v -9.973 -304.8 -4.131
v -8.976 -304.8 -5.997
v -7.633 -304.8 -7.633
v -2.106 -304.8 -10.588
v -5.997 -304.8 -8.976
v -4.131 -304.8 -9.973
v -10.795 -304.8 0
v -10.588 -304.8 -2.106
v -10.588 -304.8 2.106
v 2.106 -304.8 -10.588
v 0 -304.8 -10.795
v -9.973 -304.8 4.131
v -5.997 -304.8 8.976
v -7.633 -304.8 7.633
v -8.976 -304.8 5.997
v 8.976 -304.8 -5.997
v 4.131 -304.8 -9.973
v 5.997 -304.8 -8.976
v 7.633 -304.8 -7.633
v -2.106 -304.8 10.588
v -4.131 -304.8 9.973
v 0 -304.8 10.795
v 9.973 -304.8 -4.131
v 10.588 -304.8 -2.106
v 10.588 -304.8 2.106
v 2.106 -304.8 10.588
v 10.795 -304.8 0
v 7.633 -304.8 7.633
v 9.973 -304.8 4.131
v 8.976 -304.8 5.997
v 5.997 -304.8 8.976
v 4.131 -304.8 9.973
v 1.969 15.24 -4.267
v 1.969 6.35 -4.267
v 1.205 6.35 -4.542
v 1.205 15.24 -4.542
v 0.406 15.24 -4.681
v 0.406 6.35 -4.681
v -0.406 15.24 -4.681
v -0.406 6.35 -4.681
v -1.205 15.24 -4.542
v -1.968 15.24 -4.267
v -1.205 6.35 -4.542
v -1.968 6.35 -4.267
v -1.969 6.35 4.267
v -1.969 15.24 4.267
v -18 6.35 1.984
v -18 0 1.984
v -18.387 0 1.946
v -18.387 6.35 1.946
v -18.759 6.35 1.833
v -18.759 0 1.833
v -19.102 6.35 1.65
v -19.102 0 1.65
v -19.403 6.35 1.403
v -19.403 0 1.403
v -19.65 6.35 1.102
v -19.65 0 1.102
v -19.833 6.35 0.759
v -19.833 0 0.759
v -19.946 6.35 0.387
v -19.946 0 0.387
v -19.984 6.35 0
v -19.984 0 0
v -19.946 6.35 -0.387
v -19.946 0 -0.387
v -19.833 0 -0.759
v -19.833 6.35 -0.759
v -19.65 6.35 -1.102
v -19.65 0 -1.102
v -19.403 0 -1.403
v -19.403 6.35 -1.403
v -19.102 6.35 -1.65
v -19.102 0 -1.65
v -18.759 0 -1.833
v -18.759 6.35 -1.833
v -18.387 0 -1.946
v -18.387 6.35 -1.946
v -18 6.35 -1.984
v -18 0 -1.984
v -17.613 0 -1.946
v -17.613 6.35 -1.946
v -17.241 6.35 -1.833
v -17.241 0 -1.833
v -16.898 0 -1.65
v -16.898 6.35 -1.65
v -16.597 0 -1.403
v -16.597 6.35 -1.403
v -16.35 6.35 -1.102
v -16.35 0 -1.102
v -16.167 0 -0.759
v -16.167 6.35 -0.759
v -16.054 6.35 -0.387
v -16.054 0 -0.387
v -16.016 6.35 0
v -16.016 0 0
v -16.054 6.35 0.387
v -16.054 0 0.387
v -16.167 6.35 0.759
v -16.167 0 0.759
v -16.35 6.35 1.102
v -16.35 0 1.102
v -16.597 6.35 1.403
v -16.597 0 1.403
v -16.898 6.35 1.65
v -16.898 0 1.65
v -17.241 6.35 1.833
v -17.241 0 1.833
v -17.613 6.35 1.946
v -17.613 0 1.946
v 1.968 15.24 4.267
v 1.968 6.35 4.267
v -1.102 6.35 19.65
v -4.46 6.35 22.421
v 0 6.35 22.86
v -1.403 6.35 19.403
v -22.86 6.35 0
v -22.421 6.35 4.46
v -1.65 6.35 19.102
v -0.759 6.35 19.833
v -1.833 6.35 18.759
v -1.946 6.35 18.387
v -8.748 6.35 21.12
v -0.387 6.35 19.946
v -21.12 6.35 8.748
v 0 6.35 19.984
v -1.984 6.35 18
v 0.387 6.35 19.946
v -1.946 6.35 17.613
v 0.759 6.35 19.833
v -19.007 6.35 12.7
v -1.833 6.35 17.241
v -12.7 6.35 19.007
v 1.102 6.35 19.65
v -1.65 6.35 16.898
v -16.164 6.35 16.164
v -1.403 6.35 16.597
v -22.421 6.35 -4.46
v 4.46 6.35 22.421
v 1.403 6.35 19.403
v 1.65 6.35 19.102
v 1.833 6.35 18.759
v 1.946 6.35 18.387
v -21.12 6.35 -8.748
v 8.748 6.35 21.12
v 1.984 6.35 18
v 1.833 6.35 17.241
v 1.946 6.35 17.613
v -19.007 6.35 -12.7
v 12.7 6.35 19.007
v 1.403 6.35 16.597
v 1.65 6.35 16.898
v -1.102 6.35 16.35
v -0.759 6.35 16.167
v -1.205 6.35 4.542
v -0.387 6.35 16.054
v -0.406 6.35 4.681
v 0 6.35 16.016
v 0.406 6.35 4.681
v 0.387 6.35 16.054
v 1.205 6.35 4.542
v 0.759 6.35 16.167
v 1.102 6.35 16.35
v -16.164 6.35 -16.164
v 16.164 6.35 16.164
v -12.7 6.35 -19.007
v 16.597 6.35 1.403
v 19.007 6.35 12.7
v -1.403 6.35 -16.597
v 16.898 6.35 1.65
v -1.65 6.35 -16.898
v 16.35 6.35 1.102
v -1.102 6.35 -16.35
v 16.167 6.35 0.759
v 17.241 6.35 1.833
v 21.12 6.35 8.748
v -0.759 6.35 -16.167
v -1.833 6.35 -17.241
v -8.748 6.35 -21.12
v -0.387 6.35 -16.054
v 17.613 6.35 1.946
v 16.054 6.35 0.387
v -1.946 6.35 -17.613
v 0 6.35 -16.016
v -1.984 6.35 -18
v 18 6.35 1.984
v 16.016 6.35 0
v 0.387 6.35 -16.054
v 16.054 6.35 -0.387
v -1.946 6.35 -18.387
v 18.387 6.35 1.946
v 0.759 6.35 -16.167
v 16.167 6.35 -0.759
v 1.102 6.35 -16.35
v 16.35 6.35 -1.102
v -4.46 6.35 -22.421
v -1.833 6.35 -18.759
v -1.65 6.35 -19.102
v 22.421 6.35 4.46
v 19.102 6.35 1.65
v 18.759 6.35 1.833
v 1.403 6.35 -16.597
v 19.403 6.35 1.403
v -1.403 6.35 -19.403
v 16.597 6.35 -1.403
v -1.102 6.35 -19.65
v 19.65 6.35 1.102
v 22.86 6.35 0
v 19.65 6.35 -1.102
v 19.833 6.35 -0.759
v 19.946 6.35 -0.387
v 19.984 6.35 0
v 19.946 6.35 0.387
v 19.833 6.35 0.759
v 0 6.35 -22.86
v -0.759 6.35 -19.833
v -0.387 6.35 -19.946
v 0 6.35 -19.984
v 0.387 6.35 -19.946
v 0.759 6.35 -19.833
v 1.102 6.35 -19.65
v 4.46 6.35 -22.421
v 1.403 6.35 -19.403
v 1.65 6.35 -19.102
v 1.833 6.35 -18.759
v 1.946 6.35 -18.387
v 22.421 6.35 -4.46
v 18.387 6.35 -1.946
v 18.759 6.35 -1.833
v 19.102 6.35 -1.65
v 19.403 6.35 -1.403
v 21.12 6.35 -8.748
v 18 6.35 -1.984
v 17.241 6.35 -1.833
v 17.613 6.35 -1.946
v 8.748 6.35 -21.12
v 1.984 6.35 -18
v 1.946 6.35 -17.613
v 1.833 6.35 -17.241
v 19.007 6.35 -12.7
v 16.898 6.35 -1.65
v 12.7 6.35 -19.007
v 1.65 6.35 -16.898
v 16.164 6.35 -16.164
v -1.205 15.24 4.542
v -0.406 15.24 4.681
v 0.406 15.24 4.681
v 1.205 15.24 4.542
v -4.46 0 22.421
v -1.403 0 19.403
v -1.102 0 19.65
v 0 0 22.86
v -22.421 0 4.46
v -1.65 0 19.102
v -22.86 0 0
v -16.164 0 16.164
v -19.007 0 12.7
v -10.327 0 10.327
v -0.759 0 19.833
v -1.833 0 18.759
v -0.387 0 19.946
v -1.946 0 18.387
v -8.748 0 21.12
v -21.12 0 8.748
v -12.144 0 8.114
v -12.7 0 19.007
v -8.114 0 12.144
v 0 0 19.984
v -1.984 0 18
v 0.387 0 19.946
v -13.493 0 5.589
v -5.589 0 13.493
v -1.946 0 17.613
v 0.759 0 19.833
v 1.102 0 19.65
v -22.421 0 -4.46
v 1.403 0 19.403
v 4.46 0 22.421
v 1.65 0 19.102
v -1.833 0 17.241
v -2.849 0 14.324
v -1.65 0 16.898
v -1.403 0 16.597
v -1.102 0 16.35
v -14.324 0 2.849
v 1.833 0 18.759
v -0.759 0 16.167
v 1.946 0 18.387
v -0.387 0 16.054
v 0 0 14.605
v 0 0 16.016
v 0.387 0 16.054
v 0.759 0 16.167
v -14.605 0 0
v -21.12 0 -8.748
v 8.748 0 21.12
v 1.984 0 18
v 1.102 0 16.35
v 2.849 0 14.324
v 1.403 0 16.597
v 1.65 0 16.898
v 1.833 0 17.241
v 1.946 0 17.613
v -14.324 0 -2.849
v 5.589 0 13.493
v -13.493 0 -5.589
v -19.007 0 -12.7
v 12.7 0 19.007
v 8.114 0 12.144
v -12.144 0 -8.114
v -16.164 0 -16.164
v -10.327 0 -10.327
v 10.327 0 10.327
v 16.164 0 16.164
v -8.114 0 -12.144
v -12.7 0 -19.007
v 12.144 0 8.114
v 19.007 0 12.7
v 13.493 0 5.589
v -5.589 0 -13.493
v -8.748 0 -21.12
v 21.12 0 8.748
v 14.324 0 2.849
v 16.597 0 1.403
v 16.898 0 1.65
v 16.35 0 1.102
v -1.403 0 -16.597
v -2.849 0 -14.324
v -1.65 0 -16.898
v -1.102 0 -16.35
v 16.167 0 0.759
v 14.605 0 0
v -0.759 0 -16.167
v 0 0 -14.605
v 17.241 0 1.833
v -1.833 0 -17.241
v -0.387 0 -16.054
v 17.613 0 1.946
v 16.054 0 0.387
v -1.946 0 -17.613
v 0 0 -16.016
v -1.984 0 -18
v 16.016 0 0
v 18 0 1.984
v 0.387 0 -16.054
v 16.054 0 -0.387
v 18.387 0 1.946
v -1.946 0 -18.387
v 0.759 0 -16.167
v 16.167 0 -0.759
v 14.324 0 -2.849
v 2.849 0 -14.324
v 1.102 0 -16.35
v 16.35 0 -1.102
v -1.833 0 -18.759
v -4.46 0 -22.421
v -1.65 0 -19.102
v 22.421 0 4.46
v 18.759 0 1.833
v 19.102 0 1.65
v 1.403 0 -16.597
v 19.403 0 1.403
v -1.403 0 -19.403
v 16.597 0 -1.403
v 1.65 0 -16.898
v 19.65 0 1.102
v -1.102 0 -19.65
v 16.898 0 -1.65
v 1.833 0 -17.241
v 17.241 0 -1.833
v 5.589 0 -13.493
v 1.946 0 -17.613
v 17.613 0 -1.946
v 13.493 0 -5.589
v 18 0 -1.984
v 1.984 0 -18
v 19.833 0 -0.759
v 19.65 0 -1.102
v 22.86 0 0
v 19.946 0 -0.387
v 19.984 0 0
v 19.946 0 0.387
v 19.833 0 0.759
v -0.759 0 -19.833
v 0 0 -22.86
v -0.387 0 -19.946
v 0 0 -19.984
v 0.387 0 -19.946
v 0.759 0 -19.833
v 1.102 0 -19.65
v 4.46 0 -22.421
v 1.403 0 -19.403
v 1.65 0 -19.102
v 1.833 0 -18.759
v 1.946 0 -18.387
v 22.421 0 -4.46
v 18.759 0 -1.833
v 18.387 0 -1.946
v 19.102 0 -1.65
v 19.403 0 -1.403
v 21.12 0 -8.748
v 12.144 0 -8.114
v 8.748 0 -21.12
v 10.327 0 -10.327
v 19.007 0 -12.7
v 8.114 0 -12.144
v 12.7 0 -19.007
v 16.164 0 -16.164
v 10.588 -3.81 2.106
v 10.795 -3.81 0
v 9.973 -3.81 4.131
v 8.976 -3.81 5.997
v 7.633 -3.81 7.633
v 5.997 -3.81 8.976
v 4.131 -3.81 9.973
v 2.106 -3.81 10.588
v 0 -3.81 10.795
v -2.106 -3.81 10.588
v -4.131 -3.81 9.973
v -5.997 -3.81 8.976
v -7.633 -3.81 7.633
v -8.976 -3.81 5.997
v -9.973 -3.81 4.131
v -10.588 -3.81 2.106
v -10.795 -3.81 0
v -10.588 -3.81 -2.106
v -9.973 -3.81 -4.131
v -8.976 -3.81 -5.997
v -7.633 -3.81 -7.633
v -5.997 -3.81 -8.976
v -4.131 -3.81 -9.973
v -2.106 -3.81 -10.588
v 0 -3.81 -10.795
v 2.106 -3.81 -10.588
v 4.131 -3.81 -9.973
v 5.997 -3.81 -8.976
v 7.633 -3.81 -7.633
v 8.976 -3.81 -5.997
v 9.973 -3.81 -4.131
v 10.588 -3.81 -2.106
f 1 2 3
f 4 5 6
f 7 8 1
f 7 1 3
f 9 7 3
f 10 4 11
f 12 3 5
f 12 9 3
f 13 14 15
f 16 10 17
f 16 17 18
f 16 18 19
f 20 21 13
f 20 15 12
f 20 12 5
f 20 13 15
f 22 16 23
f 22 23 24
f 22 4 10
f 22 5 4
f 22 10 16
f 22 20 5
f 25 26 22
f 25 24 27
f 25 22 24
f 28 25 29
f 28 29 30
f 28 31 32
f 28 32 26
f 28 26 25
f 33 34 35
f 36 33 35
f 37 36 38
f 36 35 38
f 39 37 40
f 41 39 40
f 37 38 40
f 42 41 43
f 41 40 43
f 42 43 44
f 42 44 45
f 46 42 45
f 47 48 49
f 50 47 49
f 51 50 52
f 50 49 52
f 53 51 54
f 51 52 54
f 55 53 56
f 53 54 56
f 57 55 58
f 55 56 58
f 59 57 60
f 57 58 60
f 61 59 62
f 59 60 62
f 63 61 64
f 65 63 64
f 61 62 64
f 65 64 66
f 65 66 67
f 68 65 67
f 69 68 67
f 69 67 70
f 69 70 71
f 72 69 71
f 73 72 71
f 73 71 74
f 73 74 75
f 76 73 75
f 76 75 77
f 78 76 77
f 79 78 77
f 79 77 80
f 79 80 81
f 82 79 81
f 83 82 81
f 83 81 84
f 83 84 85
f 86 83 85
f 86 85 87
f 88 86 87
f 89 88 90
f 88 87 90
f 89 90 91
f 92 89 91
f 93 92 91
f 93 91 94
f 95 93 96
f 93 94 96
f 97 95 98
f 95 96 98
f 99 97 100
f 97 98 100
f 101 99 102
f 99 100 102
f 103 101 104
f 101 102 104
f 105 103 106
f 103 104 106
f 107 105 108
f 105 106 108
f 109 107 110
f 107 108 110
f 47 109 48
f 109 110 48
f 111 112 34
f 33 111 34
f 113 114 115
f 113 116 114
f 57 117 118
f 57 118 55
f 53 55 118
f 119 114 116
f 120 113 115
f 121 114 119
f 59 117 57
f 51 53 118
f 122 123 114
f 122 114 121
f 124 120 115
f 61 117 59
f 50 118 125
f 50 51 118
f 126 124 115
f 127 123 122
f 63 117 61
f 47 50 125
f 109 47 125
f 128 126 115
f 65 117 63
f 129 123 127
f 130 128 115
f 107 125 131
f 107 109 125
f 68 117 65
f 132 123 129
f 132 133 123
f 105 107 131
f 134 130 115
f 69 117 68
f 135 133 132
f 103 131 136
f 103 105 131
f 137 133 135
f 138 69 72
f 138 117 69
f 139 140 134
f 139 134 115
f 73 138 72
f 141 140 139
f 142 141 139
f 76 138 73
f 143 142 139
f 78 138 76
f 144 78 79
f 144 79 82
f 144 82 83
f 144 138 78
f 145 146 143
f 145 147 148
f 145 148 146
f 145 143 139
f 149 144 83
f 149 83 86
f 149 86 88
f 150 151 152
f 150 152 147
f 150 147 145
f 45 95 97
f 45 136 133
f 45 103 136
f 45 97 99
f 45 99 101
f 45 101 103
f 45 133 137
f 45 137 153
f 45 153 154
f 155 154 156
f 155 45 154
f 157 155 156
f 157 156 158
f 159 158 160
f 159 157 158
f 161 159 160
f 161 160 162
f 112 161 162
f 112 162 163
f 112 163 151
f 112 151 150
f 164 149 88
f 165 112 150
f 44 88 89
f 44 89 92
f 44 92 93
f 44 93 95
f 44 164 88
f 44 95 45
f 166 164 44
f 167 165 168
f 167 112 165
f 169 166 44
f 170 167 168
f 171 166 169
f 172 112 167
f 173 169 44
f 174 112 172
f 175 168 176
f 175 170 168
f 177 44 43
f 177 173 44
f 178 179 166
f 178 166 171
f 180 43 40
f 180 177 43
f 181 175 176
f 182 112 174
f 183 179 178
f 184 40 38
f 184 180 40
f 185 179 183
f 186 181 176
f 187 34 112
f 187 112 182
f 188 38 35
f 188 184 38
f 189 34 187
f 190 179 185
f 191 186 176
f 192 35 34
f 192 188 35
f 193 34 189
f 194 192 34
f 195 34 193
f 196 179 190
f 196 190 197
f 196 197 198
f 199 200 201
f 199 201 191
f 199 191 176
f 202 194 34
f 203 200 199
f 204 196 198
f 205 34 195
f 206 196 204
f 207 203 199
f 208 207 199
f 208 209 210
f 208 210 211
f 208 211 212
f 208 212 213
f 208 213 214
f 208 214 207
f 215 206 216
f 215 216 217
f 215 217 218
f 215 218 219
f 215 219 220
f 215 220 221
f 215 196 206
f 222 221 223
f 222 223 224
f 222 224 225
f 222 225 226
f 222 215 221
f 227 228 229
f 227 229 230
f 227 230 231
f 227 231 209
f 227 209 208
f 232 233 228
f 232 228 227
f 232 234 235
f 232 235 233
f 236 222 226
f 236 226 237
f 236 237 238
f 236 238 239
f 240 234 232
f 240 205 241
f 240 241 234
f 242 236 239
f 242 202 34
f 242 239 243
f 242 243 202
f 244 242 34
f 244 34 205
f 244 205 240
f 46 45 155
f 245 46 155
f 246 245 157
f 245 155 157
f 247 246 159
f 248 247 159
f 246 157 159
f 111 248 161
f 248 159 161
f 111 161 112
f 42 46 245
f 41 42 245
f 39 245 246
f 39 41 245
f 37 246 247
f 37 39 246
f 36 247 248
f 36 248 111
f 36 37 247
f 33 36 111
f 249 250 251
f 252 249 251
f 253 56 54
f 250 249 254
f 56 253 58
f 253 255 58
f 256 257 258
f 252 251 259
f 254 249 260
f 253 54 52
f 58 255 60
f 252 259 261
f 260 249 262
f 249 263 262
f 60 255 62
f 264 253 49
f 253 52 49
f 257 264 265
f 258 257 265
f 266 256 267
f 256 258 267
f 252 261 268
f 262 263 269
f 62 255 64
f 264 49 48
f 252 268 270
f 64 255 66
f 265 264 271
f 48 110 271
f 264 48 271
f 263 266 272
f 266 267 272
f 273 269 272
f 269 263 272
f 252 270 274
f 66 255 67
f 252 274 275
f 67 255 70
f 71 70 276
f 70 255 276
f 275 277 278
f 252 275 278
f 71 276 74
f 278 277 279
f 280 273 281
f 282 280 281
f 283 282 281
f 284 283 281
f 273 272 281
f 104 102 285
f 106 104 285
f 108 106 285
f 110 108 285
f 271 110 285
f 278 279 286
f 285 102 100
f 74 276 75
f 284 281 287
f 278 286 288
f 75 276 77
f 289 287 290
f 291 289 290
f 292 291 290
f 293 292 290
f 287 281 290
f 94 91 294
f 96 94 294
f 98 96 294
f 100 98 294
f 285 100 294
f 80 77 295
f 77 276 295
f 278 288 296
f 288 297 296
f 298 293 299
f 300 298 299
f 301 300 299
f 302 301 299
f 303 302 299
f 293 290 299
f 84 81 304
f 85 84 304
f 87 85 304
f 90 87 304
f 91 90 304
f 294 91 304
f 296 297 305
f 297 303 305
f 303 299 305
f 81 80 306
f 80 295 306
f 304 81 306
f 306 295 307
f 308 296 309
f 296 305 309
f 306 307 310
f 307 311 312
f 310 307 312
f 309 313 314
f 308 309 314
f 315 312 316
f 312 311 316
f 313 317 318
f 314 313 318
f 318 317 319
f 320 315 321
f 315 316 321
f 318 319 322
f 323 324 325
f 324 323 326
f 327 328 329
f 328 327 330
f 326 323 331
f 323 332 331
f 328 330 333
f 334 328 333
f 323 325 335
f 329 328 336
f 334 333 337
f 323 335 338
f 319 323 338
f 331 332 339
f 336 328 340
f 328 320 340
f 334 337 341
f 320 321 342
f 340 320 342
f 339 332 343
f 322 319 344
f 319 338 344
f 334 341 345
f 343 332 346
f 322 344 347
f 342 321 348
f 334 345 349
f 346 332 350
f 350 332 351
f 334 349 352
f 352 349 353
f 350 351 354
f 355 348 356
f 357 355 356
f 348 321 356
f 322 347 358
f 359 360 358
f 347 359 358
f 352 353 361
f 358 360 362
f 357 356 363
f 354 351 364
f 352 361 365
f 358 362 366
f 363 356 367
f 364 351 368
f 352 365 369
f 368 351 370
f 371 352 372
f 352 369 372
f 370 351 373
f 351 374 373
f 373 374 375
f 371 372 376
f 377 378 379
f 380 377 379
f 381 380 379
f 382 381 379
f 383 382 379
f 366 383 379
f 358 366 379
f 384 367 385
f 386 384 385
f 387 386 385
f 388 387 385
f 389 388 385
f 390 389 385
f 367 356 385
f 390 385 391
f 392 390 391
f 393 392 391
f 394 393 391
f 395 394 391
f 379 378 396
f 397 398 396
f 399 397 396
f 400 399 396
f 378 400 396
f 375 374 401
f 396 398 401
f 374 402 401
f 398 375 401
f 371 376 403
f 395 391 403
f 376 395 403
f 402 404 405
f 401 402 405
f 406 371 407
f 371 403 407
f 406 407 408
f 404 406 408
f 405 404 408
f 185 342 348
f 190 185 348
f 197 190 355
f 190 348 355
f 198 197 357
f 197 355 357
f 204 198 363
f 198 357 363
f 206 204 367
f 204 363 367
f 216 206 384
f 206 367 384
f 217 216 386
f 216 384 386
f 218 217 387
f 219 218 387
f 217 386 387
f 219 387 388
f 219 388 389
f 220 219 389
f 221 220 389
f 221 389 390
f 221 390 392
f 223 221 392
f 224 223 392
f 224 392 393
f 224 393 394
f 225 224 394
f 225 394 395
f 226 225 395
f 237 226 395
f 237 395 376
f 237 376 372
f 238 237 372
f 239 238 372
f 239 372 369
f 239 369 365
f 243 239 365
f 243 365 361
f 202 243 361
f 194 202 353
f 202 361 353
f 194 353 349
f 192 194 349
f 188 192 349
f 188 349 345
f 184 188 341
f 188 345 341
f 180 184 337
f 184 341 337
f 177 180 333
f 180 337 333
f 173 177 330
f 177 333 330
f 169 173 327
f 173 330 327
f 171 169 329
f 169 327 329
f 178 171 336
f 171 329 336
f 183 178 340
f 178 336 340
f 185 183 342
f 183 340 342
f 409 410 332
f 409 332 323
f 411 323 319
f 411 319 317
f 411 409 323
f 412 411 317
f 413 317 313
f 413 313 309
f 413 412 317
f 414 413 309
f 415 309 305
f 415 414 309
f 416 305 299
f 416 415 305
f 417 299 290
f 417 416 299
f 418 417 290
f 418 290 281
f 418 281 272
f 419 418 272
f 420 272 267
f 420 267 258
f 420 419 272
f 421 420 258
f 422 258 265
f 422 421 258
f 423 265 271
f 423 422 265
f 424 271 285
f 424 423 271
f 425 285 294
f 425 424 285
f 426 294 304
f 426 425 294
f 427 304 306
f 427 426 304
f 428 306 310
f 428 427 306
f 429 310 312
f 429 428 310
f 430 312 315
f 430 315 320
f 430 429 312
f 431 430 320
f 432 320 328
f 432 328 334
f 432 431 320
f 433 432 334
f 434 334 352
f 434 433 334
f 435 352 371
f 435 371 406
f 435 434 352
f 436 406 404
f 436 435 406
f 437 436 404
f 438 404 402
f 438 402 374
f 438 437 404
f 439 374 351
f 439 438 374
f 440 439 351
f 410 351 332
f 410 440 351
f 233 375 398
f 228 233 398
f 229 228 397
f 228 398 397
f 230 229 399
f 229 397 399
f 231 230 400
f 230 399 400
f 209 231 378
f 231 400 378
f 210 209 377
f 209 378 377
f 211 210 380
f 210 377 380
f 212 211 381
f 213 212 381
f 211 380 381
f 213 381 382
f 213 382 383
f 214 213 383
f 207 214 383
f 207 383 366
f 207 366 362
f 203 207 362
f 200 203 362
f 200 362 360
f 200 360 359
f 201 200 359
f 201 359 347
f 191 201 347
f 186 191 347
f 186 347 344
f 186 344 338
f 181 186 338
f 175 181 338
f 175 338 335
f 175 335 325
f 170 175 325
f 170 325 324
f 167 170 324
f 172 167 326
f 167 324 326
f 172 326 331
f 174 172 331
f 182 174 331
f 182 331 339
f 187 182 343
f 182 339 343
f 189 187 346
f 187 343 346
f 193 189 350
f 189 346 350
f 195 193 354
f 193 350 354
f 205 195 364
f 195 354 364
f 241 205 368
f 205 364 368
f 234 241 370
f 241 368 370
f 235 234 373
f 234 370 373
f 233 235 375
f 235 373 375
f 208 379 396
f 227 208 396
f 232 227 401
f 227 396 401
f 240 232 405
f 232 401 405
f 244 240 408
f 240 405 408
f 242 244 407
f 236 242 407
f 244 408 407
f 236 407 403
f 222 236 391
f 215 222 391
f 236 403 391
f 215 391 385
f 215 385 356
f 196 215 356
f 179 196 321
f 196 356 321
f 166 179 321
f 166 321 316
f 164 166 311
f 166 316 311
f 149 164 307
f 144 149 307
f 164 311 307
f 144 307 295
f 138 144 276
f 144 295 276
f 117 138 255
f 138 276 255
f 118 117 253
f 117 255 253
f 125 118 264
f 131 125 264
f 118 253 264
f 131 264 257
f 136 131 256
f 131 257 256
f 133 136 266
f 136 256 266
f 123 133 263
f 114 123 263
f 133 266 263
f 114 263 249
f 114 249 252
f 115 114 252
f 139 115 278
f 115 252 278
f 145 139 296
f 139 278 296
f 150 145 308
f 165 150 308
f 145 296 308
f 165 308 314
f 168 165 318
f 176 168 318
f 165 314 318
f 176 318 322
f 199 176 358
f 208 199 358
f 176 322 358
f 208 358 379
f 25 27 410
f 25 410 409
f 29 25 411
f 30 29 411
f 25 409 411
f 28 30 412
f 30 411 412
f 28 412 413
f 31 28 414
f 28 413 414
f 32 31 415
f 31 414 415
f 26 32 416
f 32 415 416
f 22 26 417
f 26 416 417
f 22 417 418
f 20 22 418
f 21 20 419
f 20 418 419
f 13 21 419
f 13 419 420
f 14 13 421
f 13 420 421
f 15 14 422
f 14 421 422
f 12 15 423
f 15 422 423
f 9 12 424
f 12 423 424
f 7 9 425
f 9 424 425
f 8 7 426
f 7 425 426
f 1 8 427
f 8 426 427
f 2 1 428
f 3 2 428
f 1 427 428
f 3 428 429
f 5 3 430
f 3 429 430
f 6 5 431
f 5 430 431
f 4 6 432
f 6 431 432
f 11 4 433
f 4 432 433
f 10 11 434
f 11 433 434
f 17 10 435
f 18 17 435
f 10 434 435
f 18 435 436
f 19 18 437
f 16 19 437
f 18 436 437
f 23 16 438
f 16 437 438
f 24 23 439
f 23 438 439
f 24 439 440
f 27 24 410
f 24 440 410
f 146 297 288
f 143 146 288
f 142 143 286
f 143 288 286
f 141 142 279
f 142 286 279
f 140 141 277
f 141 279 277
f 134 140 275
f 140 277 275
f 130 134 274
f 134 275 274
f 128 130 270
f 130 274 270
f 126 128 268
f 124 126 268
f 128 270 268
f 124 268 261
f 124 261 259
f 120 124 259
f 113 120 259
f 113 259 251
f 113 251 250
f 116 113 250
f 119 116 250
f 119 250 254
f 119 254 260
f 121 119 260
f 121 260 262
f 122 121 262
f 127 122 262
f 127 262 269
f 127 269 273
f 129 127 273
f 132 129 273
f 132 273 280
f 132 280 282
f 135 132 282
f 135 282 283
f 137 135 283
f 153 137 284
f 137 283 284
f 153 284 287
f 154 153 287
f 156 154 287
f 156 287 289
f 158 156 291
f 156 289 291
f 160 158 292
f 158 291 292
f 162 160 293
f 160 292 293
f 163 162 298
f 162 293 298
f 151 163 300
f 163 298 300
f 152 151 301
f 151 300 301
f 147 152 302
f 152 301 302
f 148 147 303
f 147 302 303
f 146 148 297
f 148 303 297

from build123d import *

# Parameters (mm, degrees)
SKETCH1_R                           = 22.86
BOSS_EXTRUDE1_DEPTH                 = 6.35
BOSS_EXTRUDE2_DEPTH                 = 8.89
SKETCH3_R                           = 10.795
BOSS_EXTRUDE3_DEPTH                 = 304.8
CHAMFER1_SIZE                       = 3.81
F_5_32_0_15625_DIAMETER_HOLE1_D     = 3.96875
F_5_32_0_15625_DIAMETER_HOLE1_DEPTH = 6.351
CIRPATTERN1_COUNT                   = 4


with BuildPart() as part:
    # Sketch1 → Boss-Extrude1 (new body)
    with BuildSketch(Plane(origin=(0, 0, 0), x_dir=(1, 0, 0), z_dir=(0, 1, 0))):
        Circle(SKETCH1_R)
    extrude(amount=BOSS_EXTRUDE1_DEPTH)

    # Sketch2 → Boss-Extrude2 (add)
    with BuildSketch(Plane(origin=(0, 6.35, 0), x_dir=(1, 0, 0), z_dir=(0, 1, 0))):
        with BuildLine():
            Line((1.9685, -4.266803107), (1.9685, 4.266803107))
            ThreePointArc((1.9685, 4.266803107), (0, 4.699), (-1.9685, 4.266803107))
            Line((-1.9685, 4.266803107), (-1.9685, -4.266803107))
            ThreePointArc((-1.9685, -4.266803107), (0, -4.699), (1.9685, -4.266803107))
        make_face()
    extrude(amount=BOSS_EXTRUDE2_DEPTH)

    # Sketch3 → Boss-Extrude3 (add)
    with BuildSketch(Plane.XZ):
        Circle(SKETCH3_R)
    extrude(amount=BOSS_EXTRUDE3_DEPTH)

    # Chamfer1
    chamfer1_edges = [part.edges().sort_by_distance(p)[0] for p in [
        (-10.795, 0, 0),
    ]]
    chamfer(chamfer1_edges, length=CHAMFER1_SIZE)

    # 5/32 (0.15625) Diameter Hole1
    with Locations(Plane(origin=(0, 6.35, 0), x_dir=(1, 0, 0), z_dir=(0, 1, 0))):
        with Locations((0, 18)):
            f_5_32_0_15625_diameter_hole1 = Hole(F_5_32_0_15625_DIAMETER_HOLE1_D / 2, depth=F_5_32_0_15625_DIAMETER_HOLE1_DEPTH)

    # CirPattern1: 5/32 (0.15625) Diameter Hole1 ×4 about axis
    cirpattern1_axis = Axis((0, 0, 0), (0, 1, 0))
    for i in range(1, CIRPATTERN1_COUNT):
        add(f_5_32_0_15625_diameter_hole1.rotate(cirpattern1_axis, i * 360 / CIRPATTERN1_COUNT), mode=Mode.SUBTRACT)


solid = part.part
